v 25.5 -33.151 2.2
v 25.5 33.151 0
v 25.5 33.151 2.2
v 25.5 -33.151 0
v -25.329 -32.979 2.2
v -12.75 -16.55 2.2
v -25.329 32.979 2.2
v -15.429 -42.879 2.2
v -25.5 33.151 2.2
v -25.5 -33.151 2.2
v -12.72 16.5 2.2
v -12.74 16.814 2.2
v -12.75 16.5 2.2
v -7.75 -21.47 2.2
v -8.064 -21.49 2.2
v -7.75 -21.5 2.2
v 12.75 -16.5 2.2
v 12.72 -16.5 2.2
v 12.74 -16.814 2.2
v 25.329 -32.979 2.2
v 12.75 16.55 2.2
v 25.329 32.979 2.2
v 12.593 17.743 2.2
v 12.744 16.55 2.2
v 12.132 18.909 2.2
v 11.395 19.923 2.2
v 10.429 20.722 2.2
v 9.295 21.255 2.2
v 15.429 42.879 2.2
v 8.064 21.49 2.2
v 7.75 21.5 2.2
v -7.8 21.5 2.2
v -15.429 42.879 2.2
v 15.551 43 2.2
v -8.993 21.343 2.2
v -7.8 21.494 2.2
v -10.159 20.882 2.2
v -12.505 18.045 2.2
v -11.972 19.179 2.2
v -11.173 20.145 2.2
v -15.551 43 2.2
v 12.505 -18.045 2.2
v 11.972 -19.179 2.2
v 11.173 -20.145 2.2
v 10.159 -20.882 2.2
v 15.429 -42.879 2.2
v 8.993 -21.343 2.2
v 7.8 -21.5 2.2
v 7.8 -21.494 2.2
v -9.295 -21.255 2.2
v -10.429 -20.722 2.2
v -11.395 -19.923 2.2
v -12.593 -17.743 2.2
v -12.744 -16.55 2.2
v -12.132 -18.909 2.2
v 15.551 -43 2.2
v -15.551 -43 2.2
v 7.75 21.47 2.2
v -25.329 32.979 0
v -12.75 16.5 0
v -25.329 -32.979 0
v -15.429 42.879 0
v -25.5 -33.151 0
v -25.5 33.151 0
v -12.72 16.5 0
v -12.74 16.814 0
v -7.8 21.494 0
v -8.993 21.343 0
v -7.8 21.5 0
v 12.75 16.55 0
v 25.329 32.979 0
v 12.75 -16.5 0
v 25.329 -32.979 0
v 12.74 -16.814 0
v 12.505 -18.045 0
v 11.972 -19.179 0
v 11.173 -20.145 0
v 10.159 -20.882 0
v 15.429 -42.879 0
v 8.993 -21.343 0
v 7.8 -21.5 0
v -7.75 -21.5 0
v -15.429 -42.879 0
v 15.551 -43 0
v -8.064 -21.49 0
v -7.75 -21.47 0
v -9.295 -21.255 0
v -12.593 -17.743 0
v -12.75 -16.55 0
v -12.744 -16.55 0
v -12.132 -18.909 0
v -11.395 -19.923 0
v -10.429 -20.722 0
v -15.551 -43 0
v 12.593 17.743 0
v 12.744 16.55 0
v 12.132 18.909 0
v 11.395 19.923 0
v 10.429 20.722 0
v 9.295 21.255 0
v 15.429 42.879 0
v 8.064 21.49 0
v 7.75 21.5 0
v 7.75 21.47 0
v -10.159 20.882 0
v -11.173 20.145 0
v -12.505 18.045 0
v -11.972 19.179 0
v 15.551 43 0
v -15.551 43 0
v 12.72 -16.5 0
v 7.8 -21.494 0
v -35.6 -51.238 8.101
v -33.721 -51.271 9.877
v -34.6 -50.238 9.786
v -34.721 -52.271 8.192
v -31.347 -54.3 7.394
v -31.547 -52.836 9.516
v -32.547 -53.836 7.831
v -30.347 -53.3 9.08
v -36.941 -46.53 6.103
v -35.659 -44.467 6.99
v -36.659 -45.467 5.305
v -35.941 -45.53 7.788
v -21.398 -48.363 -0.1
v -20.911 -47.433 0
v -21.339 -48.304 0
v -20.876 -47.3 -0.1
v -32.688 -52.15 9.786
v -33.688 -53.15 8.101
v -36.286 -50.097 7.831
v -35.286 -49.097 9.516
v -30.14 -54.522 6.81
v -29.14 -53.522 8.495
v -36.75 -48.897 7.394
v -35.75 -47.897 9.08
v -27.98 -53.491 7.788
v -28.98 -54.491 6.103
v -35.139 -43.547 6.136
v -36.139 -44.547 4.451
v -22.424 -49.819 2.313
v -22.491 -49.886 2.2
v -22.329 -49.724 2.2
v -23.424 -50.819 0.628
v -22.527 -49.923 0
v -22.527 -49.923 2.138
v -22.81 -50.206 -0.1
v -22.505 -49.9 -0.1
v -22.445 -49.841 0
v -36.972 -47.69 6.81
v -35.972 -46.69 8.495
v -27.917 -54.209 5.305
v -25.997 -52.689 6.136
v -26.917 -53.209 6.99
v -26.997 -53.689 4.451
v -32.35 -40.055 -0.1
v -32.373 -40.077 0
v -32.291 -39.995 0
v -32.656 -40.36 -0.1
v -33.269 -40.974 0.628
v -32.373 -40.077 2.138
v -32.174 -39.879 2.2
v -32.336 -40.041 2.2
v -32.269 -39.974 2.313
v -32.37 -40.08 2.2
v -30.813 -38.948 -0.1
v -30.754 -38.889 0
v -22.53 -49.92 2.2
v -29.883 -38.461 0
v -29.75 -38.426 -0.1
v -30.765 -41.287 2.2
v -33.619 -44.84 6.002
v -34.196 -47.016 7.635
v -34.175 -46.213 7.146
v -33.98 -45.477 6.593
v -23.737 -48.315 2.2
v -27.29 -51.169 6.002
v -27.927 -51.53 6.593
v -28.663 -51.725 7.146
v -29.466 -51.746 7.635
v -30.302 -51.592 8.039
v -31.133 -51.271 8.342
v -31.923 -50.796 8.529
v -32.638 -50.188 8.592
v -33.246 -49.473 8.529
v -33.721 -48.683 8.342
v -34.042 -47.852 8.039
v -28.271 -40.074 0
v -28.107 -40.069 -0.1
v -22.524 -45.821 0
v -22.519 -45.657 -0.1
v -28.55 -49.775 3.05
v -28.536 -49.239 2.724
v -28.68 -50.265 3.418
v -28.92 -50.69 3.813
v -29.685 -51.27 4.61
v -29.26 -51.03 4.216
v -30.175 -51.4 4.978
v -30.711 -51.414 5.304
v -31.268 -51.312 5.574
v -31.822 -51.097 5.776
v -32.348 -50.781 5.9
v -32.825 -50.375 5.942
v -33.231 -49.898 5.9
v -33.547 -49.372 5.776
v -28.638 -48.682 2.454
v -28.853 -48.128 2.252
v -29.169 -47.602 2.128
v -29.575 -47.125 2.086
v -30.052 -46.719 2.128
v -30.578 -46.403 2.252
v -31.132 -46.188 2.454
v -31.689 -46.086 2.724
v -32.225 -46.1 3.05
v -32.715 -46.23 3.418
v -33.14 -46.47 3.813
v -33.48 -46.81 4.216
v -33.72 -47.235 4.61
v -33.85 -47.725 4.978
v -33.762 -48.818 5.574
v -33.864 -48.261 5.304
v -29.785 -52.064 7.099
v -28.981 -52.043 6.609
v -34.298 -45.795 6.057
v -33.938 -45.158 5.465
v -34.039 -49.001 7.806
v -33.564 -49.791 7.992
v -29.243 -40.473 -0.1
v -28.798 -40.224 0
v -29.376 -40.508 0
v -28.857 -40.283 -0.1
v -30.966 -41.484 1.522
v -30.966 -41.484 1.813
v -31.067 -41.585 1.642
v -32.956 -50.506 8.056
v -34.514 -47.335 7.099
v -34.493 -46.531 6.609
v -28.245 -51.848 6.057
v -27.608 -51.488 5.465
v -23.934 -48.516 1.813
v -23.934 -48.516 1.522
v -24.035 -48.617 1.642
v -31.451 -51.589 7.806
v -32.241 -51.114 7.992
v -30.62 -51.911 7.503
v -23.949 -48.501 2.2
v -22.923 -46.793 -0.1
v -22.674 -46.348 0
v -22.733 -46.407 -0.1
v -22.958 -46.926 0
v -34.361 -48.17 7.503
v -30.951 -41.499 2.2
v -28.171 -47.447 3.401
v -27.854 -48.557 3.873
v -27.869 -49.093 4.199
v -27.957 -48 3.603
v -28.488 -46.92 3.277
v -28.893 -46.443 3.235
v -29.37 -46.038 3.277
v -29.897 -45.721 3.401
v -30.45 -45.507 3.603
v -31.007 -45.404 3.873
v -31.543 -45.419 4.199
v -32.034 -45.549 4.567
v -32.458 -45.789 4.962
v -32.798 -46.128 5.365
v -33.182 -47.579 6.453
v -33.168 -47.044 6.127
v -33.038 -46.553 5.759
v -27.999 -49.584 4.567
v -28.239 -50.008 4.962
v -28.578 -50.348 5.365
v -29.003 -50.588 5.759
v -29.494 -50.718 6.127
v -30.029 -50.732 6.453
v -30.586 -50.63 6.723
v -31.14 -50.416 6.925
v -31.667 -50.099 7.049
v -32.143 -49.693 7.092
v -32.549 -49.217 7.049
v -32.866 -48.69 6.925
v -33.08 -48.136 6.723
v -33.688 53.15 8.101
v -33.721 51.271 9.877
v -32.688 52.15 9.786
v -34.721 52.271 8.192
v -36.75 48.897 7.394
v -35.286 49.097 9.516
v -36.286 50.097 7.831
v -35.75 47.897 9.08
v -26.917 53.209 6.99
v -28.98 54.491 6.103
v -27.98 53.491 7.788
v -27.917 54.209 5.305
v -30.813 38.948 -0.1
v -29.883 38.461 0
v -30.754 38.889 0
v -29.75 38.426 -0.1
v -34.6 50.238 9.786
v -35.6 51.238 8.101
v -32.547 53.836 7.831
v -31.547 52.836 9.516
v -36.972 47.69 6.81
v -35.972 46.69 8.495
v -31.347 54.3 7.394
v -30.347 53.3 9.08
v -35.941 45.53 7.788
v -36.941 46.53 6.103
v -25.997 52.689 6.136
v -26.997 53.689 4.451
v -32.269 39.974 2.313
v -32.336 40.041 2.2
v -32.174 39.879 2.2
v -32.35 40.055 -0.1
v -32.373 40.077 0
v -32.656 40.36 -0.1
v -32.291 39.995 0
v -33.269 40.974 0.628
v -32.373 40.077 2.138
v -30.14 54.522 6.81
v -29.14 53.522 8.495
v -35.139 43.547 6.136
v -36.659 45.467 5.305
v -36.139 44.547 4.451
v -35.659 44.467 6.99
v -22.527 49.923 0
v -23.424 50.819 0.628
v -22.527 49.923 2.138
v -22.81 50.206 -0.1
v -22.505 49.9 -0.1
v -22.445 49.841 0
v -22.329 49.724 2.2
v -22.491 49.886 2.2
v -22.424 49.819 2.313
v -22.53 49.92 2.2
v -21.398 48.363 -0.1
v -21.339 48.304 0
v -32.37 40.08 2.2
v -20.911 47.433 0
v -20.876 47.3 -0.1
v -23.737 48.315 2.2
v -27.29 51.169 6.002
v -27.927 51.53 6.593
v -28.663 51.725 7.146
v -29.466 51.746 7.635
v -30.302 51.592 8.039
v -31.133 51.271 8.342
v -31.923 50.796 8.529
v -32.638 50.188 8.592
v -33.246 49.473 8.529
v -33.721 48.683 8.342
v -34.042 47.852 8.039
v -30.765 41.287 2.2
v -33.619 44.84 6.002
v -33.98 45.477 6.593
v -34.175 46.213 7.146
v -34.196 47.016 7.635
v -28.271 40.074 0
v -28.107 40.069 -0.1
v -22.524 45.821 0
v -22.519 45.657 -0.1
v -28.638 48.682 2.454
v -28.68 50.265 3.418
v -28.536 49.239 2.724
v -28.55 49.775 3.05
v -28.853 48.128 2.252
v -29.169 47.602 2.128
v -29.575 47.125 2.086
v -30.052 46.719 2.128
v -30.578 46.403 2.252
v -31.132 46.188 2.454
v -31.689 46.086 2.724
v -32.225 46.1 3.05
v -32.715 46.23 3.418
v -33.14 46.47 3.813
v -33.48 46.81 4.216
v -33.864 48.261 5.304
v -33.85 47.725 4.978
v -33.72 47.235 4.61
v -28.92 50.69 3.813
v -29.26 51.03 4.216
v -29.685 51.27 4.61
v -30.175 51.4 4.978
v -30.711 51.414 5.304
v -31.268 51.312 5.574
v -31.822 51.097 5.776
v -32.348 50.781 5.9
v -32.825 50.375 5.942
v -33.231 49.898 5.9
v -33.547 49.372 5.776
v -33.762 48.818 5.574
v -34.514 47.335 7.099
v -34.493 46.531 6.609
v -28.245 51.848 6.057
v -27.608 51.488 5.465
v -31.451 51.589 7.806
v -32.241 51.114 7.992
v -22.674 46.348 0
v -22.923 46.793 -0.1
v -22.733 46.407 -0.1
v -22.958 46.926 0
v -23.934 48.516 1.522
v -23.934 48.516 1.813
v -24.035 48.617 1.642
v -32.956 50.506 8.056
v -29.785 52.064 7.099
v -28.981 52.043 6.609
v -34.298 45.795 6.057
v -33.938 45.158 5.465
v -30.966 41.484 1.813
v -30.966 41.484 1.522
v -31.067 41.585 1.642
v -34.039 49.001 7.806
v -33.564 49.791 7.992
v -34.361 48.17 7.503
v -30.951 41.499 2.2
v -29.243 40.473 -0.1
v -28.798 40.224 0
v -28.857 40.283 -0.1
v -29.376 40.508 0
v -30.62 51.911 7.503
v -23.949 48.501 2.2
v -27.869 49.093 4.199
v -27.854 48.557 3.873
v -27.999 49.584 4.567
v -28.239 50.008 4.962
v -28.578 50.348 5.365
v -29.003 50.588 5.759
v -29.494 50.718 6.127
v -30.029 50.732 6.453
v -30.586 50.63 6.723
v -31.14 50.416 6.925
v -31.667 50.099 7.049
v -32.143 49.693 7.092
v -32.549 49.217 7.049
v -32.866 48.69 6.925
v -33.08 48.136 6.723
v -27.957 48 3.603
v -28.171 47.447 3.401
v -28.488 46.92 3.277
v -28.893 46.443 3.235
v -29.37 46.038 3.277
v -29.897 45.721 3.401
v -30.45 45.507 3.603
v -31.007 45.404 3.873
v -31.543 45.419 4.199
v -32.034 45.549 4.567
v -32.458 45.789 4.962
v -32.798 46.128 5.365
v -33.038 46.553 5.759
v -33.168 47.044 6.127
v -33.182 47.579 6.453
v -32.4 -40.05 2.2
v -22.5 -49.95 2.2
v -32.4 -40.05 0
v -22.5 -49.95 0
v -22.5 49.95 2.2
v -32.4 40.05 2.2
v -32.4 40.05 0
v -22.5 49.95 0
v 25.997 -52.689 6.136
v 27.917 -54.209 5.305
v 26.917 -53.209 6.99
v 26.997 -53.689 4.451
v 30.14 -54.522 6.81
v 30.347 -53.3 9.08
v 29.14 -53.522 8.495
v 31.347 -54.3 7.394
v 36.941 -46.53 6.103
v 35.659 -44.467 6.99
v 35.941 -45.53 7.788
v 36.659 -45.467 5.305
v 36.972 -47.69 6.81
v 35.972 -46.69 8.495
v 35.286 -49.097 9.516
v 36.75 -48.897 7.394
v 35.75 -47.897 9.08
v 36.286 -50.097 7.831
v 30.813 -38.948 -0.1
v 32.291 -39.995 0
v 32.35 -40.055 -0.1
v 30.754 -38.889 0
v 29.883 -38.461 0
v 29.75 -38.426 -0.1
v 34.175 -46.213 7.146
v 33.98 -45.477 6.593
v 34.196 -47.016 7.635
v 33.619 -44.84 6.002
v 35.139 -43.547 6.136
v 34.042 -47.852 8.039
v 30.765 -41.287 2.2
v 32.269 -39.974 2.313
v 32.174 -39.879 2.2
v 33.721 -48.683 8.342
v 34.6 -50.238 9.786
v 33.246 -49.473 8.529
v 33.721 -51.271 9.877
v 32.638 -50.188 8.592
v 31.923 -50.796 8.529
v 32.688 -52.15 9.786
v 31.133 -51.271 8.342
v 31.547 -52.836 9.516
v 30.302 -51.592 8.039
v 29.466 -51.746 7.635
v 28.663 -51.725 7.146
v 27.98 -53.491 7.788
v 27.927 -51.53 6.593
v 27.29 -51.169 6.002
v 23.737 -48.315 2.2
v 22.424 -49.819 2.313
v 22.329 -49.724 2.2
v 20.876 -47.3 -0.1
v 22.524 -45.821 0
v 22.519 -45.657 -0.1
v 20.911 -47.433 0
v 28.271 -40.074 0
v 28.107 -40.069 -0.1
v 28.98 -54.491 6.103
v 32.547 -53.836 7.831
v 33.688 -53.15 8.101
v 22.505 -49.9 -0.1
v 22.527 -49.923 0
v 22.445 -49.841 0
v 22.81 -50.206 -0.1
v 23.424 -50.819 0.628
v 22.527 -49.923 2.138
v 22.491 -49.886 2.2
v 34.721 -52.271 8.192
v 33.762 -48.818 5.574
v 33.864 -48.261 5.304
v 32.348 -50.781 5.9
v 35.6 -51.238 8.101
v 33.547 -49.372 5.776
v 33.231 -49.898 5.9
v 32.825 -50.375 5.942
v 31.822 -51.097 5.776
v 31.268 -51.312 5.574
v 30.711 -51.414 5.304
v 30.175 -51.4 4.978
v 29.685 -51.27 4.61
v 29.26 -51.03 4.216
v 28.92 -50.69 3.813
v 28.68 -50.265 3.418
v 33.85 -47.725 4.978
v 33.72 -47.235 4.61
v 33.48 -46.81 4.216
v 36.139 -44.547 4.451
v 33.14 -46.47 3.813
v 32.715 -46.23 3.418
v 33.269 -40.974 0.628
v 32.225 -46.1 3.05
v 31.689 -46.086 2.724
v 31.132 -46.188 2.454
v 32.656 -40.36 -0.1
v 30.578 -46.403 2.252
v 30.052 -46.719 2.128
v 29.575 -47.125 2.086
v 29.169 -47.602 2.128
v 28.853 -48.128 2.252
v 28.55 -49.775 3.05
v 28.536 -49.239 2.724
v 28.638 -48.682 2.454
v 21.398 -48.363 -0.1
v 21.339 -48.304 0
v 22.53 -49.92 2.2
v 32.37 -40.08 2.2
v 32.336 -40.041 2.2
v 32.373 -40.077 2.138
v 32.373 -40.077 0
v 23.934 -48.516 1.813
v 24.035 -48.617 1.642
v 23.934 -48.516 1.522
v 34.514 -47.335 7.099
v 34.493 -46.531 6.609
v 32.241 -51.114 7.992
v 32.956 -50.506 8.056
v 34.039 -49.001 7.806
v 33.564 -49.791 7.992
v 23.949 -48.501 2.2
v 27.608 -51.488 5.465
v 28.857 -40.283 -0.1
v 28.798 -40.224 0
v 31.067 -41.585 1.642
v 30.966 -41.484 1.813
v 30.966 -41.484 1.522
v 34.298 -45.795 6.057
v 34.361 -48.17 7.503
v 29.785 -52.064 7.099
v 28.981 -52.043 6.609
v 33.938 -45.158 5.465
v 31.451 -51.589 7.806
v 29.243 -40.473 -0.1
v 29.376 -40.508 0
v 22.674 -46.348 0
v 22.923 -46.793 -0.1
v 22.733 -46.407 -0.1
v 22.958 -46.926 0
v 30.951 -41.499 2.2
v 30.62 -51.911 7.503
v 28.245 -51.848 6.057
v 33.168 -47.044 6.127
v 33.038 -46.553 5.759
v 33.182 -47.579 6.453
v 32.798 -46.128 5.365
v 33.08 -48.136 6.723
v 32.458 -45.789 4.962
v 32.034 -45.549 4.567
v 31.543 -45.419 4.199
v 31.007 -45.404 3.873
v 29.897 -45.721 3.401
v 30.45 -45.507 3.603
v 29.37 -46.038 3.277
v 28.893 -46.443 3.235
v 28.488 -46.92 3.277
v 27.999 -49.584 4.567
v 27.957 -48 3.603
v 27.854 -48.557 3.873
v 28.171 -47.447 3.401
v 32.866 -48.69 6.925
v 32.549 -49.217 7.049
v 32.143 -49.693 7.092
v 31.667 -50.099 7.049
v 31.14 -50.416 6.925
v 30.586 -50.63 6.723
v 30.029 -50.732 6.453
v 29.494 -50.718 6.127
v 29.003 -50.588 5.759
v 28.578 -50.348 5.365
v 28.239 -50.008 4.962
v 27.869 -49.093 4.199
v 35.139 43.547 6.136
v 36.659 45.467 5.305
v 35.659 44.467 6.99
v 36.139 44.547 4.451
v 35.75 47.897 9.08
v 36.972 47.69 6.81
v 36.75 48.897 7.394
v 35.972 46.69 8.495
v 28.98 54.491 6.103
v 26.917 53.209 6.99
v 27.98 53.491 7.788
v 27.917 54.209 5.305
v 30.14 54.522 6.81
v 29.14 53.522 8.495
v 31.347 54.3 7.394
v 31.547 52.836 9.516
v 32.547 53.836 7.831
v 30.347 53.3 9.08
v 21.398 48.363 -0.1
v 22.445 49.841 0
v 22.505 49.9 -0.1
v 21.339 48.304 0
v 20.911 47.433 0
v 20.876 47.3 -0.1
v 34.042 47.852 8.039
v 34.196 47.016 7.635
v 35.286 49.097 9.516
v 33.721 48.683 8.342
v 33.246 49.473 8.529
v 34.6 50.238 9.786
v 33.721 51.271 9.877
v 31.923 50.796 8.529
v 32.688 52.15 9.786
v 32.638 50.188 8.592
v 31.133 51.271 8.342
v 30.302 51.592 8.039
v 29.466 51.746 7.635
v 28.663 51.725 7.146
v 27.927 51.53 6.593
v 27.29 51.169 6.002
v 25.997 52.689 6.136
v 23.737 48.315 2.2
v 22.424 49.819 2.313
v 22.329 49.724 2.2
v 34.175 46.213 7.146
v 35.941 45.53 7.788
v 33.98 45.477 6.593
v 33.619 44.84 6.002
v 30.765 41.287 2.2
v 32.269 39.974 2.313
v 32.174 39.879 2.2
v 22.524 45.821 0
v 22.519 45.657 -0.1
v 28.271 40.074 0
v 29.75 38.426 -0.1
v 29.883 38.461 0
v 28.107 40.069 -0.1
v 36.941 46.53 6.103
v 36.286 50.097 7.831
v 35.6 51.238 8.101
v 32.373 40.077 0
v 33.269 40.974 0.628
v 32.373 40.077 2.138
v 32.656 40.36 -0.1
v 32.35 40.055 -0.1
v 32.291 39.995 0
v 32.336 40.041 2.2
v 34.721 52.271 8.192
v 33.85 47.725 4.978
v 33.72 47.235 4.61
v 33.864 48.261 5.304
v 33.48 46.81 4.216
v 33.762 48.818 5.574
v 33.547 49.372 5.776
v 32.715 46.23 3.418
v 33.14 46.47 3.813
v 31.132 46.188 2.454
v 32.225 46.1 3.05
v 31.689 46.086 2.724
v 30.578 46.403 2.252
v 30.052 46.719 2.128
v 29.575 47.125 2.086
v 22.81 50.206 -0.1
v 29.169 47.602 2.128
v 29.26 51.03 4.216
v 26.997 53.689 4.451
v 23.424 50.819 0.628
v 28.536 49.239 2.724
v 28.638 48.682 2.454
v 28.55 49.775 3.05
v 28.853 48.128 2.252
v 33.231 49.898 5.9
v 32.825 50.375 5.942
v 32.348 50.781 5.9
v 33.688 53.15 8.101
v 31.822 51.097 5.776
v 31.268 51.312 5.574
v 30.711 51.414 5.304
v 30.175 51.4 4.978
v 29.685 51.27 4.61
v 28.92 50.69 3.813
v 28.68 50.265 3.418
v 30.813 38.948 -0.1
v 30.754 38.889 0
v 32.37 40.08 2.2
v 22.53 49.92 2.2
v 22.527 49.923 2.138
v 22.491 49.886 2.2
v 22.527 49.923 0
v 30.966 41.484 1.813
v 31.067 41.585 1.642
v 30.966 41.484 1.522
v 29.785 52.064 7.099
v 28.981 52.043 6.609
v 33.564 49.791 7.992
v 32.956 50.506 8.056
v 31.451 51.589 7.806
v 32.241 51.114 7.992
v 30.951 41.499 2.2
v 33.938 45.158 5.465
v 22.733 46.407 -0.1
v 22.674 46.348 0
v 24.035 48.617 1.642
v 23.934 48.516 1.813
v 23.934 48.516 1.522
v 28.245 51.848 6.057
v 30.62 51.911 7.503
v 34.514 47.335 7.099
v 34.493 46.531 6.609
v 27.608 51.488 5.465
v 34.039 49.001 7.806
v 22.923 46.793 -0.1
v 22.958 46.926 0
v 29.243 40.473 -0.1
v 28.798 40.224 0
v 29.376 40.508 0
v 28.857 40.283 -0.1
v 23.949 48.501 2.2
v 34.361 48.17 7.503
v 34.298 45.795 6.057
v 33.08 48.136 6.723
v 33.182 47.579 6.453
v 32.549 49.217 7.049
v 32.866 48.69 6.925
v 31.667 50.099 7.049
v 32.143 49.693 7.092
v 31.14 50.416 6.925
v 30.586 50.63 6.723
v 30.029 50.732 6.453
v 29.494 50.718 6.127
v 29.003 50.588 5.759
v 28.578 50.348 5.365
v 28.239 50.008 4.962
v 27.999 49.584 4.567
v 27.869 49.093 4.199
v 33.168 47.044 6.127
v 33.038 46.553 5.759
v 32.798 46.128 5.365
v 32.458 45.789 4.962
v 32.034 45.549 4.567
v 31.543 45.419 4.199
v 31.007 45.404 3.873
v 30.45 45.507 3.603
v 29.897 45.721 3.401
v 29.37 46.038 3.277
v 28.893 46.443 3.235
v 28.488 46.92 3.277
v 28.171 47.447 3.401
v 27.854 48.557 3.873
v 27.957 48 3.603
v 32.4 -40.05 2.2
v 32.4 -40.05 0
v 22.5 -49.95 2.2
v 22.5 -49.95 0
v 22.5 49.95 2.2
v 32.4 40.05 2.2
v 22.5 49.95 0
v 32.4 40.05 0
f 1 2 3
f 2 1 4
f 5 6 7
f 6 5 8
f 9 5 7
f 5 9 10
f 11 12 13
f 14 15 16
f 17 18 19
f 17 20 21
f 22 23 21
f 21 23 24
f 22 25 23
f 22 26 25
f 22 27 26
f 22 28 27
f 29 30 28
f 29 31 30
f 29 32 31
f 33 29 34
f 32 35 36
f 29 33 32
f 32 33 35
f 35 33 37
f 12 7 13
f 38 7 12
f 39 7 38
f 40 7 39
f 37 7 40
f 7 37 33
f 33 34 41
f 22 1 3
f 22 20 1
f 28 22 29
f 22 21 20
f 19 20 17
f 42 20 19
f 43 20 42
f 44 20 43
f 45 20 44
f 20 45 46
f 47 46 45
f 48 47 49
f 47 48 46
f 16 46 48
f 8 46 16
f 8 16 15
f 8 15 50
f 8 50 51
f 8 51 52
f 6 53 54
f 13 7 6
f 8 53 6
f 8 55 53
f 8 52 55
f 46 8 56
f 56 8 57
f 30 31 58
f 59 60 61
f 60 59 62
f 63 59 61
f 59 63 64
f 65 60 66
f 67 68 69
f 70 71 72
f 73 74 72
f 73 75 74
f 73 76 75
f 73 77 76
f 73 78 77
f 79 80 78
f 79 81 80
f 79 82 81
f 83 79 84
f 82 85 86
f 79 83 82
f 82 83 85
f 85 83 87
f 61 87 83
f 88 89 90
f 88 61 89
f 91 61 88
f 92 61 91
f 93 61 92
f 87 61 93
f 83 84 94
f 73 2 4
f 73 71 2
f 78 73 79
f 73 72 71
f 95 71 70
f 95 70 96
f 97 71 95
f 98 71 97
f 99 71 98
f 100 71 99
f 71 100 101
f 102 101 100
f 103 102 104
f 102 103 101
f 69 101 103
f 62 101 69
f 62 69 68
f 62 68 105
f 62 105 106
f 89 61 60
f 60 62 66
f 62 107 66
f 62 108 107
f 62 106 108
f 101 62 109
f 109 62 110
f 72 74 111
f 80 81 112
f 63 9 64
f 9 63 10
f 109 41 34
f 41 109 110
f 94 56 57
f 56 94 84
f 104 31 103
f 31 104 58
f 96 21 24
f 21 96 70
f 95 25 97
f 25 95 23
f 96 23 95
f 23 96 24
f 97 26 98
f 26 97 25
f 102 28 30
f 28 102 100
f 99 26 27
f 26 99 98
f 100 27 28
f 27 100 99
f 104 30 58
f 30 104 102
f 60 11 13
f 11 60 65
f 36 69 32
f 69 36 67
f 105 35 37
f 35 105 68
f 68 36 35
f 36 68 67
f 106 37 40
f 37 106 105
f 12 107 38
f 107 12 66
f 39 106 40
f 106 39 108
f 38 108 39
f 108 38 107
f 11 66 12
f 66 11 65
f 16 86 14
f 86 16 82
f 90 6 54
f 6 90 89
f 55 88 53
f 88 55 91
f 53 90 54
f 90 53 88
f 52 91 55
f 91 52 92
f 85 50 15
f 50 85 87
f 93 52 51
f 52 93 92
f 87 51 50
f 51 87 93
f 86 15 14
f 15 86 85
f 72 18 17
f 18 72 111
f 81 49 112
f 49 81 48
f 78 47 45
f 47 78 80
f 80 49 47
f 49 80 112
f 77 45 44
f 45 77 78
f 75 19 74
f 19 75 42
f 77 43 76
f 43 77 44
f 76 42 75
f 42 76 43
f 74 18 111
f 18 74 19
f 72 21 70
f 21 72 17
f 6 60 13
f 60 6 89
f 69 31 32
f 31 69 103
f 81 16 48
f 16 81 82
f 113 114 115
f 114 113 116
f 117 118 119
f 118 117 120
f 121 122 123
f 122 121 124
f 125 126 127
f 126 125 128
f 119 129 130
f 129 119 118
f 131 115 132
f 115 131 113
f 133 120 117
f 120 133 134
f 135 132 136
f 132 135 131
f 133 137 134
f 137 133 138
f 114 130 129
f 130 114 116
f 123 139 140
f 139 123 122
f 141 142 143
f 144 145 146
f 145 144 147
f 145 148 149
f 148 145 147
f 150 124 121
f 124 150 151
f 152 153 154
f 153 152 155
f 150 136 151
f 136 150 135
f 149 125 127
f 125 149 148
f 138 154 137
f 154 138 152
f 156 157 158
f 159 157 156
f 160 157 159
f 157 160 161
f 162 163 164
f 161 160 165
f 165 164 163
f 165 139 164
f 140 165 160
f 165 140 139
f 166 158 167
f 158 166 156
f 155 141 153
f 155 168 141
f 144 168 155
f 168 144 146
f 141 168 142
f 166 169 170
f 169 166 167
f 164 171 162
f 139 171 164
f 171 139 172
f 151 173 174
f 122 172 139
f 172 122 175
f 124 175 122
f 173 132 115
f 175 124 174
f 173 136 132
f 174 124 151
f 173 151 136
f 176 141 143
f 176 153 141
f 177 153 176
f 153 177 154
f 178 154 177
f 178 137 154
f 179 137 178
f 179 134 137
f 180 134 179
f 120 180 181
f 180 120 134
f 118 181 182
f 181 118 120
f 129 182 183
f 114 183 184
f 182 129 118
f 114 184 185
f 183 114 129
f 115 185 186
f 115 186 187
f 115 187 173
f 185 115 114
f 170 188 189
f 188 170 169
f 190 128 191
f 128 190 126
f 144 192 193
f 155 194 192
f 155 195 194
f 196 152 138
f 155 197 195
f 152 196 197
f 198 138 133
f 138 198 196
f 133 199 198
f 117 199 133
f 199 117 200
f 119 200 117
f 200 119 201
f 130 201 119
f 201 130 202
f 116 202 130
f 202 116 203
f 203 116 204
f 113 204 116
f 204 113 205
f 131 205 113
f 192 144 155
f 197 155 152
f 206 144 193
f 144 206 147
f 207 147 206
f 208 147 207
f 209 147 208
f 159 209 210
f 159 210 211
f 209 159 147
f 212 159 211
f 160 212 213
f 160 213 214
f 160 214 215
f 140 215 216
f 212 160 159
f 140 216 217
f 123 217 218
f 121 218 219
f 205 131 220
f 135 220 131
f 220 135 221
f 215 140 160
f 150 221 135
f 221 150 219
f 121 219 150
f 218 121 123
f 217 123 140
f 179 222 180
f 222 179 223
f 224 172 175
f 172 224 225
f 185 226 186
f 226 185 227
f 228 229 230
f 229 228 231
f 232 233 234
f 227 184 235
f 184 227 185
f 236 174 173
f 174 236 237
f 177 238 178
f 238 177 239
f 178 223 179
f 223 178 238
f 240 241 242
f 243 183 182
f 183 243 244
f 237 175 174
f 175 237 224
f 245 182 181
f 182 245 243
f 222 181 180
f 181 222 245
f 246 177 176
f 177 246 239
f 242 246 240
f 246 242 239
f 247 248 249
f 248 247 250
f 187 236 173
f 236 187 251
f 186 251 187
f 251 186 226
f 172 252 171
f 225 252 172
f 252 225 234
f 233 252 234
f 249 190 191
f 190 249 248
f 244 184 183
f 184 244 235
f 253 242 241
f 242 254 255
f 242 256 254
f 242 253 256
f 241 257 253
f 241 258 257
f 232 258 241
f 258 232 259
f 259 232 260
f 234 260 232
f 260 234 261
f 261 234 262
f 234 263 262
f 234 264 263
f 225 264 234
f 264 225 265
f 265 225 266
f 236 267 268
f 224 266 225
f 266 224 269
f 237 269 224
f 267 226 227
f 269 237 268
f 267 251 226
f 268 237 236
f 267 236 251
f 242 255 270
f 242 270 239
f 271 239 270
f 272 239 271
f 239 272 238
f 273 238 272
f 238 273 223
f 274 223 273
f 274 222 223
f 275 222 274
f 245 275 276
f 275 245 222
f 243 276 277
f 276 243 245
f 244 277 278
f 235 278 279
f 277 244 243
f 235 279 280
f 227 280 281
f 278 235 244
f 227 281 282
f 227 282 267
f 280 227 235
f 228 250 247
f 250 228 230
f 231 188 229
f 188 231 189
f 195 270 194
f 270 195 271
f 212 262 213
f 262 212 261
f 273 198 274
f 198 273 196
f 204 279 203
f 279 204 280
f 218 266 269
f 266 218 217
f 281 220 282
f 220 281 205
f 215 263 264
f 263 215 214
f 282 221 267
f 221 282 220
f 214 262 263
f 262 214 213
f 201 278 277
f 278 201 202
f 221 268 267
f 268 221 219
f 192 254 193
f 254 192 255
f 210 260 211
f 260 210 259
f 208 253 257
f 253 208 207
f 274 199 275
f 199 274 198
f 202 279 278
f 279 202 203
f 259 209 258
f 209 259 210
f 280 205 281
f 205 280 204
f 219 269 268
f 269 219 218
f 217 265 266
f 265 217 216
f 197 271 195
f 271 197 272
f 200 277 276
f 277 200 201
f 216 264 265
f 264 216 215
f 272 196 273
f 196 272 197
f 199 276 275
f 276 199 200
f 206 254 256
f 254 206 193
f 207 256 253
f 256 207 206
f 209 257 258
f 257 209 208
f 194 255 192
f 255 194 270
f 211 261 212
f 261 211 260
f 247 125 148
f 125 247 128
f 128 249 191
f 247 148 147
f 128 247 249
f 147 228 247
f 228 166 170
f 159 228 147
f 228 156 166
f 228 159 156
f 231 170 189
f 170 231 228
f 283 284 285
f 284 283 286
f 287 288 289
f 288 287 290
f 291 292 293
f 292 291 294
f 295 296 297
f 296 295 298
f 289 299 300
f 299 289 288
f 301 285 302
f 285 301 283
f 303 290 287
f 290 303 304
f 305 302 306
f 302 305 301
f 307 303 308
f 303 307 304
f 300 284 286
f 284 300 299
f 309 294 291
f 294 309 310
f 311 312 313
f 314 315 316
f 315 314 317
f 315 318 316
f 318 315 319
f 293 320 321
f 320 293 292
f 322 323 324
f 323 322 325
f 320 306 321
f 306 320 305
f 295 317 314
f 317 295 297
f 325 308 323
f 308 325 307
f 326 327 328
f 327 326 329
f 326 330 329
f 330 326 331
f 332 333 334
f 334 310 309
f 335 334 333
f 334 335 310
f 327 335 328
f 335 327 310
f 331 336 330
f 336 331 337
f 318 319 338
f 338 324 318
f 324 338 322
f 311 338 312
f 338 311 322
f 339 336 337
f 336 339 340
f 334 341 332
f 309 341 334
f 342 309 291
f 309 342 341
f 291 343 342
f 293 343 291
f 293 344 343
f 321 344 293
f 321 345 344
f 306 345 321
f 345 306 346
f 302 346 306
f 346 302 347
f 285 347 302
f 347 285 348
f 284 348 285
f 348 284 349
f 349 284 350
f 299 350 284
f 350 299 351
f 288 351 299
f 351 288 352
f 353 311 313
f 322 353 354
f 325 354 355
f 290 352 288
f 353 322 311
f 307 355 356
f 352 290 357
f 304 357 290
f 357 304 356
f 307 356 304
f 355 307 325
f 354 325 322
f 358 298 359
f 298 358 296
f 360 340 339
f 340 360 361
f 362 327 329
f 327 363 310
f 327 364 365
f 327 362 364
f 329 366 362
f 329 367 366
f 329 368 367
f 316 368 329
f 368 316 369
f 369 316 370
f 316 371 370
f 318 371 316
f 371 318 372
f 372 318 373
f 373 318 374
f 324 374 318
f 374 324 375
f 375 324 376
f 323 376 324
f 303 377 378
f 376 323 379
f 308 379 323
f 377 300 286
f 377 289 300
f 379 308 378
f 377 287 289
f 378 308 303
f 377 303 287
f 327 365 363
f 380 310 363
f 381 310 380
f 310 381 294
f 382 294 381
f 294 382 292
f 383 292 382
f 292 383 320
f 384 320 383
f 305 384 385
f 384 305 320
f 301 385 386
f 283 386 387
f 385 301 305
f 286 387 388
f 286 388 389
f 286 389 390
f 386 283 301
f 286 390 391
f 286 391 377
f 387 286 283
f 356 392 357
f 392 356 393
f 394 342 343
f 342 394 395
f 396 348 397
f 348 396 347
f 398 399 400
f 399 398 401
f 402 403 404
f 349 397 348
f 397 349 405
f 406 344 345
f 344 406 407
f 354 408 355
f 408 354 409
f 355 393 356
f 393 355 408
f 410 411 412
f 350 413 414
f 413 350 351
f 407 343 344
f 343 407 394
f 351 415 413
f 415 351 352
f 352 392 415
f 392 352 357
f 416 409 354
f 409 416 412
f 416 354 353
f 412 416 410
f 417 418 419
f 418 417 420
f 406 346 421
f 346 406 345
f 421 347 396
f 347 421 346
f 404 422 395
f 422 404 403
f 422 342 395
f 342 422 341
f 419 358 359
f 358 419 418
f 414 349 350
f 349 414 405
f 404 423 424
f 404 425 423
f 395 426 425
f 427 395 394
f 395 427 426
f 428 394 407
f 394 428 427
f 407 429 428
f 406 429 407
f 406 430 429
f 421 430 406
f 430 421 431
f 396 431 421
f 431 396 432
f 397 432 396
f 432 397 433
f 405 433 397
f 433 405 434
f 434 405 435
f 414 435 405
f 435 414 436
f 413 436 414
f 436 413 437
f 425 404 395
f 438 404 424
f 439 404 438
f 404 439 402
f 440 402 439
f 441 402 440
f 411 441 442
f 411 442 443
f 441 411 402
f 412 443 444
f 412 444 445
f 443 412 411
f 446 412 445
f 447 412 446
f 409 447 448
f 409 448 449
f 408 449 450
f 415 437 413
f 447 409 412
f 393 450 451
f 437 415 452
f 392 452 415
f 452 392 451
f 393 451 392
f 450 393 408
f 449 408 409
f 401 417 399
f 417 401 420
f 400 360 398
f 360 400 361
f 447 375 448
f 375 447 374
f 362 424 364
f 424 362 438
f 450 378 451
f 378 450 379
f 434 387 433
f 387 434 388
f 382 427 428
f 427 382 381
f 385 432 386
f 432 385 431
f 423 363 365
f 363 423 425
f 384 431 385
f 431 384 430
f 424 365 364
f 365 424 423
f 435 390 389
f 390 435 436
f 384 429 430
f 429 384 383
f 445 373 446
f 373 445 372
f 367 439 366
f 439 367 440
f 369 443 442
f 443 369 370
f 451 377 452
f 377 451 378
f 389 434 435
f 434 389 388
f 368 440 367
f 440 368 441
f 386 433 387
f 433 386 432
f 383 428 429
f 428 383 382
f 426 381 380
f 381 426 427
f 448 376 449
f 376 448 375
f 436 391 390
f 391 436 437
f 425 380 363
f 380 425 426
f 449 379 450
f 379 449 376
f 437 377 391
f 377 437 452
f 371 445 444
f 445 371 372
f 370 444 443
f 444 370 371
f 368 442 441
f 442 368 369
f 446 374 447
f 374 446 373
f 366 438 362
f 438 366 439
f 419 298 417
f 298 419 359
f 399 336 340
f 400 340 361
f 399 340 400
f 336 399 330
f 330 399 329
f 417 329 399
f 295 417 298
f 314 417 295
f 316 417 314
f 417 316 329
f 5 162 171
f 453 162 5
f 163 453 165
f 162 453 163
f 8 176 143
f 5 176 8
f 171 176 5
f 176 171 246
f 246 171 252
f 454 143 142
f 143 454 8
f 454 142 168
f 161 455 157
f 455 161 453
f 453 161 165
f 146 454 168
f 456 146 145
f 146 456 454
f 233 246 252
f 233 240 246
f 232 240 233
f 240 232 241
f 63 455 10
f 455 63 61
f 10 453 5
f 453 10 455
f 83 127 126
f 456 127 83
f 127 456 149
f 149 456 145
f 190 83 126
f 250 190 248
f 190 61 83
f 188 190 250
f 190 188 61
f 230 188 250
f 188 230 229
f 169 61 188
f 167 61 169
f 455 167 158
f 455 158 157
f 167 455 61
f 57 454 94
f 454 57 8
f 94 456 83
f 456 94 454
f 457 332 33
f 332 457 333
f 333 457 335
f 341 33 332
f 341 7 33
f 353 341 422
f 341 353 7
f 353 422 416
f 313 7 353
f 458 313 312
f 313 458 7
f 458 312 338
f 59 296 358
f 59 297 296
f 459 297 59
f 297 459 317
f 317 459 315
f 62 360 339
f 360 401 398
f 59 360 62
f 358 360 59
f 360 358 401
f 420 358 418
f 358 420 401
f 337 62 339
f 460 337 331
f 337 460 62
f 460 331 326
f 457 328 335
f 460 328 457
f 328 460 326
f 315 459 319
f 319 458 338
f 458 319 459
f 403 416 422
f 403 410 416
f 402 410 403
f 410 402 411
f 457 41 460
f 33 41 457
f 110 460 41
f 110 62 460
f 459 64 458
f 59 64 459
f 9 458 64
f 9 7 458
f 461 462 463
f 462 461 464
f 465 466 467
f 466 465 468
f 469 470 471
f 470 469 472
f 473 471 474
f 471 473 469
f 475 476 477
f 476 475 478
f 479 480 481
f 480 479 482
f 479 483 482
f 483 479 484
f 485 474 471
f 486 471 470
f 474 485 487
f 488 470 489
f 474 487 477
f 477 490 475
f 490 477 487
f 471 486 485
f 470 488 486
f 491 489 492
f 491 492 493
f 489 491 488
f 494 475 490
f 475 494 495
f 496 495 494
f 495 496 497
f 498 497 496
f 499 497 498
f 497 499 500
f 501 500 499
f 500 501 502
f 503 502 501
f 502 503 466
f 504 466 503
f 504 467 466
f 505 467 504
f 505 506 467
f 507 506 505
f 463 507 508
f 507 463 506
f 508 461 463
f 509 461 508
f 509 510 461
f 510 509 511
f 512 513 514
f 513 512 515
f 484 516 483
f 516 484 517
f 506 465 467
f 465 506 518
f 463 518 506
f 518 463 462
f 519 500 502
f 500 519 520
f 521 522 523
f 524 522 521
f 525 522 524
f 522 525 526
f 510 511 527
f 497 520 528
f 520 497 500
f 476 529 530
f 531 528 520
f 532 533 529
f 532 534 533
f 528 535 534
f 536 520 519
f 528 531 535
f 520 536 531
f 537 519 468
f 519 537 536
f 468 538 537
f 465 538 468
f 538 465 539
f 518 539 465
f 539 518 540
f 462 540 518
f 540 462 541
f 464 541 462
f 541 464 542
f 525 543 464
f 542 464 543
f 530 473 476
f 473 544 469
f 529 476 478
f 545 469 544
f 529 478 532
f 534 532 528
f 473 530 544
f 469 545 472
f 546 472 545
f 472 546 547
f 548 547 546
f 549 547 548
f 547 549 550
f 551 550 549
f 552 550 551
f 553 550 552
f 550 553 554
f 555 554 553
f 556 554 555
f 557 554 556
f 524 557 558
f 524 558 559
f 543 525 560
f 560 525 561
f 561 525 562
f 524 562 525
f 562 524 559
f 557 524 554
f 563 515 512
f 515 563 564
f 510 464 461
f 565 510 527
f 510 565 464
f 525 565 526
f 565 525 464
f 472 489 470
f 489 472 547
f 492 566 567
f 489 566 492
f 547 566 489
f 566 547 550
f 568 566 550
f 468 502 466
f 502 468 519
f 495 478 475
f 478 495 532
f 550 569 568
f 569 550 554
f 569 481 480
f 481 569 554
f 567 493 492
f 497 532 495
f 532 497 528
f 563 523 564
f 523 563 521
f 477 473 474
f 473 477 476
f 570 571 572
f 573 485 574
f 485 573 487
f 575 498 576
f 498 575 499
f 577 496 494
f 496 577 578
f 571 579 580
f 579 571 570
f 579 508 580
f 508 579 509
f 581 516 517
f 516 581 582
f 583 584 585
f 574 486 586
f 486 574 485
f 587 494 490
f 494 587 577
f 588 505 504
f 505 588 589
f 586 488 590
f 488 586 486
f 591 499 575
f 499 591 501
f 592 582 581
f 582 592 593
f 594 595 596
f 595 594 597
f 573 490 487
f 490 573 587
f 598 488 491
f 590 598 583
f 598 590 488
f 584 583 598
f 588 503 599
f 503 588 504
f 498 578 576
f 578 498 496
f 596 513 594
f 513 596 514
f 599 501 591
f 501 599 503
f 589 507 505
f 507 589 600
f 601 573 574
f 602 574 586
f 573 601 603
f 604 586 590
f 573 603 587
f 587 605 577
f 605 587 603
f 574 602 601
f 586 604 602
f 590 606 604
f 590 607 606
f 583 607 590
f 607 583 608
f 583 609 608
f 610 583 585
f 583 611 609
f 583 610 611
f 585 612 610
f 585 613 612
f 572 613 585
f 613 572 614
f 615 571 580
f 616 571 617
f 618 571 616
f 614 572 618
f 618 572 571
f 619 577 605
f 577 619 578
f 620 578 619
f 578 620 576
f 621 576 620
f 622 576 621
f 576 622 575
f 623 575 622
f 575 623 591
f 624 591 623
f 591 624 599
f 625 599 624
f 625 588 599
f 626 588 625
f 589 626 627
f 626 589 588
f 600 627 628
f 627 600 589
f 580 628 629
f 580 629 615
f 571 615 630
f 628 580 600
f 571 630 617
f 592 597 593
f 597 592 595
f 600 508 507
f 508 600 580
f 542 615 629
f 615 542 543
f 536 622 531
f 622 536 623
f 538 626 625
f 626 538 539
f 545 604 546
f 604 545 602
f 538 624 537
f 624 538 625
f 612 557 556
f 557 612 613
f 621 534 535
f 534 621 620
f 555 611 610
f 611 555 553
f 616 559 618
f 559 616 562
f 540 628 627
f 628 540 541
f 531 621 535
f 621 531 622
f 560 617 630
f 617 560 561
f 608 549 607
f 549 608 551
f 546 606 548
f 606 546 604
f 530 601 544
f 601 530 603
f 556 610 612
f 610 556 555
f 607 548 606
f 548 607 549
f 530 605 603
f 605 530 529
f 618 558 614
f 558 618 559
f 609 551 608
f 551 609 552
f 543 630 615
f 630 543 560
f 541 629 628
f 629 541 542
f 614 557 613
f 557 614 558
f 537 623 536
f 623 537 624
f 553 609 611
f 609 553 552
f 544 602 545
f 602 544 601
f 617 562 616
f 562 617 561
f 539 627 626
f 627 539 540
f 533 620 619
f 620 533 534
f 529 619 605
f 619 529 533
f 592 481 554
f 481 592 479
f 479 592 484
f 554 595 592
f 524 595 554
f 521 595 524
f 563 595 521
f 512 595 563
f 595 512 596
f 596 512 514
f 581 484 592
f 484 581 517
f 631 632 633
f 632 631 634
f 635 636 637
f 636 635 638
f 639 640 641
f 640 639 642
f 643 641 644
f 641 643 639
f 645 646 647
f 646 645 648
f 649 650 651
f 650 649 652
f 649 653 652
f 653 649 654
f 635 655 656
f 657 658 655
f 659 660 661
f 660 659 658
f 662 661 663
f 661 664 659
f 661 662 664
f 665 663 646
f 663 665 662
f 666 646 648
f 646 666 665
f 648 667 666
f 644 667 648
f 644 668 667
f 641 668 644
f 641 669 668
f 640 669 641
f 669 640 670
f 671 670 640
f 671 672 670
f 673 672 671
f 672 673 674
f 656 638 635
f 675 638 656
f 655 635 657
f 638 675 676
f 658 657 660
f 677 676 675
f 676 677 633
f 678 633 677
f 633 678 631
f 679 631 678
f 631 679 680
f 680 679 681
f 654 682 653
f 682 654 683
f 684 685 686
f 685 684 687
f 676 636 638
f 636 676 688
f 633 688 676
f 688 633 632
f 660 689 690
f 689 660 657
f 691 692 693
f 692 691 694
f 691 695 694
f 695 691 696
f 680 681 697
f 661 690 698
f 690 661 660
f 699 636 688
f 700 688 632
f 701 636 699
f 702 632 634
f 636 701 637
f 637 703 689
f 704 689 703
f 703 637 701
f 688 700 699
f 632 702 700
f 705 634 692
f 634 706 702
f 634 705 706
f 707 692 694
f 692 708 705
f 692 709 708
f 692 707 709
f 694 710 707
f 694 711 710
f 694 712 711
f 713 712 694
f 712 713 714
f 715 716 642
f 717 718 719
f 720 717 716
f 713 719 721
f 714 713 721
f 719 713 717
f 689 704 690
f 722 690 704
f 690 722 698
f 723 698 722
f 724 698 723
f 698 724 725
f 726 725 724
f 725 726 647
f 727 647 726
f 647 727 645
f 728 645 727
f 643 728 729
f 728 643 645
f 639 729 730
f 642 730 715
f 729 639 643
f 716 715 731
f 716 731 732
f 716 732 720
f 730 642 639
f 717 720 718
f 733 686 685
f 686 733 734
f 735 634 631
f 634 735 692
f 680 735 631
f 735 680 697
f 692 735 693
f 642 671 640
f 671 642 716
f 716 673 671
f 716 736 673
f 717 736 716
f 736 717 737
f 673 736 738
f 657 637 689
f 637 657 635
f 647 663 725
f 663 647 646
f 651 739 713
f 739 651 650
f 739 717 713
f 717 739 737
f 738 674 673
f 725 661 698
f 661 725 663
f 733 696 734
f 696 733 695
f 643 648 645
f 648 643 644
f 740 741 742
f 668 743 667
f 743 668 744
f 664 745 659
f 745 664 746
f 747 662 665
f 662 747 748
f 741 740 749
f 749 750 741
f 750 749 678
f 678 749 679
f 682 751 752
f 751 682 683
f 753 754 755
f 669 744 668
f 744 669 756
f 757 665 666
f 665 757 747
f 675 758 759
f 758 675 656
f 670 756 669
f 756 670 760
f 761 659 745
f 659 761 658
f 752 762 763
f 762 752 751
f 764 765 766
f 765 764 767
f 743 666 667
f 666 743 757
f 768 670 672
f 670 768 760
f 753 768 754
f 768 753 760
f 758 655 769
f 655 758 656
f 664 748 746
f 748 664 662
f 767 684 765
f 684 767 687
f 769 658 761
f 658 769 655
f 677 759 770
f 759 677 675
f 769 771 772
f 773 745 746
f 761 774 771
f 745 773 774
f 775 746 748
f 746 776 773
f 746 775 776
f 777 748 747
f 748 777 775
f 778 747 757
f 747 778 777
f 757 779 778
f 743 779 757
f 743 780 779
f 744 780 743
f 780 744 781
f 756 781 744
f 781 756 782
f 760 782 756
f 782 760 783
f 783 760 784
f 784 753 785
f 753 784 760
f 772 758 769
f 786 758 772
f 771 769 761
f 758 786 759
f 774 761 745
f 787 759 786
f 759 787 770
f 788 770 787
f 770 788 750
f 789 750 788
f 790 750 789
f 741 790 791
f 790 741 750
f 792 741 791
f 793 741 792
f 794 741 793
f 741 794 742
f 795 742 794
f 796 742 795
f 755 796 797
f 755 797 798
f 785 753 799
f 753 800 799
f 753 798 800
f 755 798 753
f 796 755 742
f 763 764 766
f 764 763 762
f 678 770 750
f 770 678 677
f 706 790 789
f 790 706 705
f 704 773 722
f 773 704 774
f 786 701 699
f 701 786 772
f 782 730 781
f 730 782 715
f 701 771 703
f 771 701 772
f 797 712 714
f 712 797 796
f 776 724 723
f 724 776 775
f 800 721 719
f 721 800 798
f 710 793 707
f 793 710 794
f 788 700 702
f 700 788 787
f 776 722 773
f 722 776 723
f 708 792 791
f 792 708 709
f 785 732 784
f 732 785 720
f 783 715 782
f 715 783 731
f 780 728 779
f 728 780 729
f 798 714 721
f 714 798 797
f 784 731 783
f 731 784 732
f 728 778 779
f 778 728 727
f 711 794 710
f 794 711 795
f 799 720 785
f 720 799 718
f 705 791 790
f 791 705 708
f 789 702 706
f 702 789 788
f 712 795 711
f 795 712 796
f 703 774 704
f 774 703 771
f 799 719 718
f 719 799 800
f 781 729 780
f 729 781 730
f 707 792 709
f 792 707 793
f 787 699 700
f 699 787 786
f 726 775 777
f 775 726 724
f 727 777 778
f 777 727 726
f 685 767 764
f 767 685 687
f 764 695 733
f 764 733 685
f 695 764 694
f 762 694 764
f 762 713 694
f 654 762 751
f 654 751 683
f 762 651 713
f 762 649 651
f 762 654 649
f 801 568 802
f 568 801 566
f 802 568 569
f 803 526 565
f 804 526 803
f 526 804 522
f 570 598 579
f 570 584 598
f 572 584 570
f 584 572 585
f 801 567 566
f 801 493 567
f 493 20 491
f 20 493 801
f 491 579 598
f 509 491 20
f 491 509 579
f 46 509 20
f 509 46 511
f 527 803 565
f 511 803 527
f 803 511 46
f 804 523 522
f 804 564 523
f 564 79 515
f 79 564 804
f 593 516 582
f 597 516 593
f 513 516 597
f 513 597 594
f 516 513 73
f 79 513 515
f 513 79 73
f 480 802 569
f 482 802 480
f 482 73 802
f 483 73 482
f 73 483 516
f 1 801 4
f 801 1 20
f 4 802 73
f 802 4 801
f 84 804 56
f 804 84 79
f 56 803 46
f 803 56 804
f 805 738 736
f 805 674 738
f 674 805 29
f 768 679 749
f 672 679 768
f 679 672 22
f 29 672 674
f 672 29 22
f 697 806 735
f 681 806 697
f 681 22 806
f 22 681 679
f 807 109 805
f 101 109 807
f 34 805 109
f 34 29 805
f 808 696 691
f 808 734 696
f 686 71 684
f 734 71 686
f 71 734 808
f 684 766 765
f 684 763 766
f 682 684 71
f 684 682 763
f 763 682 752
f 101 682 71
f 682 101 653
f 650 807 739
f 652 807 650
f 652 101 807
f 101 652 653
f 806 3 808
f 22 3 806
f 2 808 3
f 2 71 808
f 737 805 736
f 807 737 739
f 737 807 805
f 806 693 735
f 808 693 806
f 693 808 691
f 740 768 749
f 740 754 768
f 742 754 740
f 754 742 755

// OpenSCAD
// file: library/nutsnbolts/data-access.scad
// Norm Nuts and Bolts - a OpenSCAD library
// Copyright (C) 2012  Johannes Kneer

// This program is free software: you can redistribute it and/or modify
// it under the terms of the GNU General Public License as published by
// the Free Software Foundation, either version 3 of the License, or
// (at your option) any later version.

// This program is distributed in the hope that it will be useful,
// but WITHOUT ANY WARRANTY; without even the implied warranty of
// MERCHANTABILITY or FITNESS FOR A PARTICULAR PURPOSE.  See the
// GNU General Public License for more details.

// You should have received a copy of the GNU General Public License
// along with this program.  If not, see <http://www.gnu.org/licenses/>.


// DATABASE ACCESS FUNCTIONS AND CONSTANTS



// == CONSTANTS == 

// screw table access keys
_NB_S_DESC            = 0;
_NB_S_FAMKEY			 = 1;
_NB_S_LENGTH          = 2;
_NB_S_NOTHREAD_LENGTH = 3;

_NB_F_DESC			 = 0;
_NB_F_OUTER_DIA       = 1;
_NB_F_INNER_DIA       = 2;
_NB_F_LEAD            = 3; 
_NB_F_KEY             = 4;
_NB_F_KEY_DEPTH       = 5;
_NB_F_HEAD_HEIGHT     = 6;
_NB_F_HEAD_DIA        = 7;
_NB_F_NUT_KEY         = 8;
_NB_F_NUT_HEIGHT      = 9;


// == FUNCTIONS ==

// _get_screw("descriptor")   with descriptor = M8x25
//   find the line for a general object in the data matrix

function _get_screw(n) = data_screw[search([n], data_screw)[0]];
function _get_screw_fam(n) = data_screw_fam[search([_get_screw(n)[_NB_S_FAMKEY]], data_screw_fam)[0]];

function _get_fam(n) = data_screw_fam[search([n], data_screw_fam)[0]];


// _get_XXXXX("descriptor") functions
// find a single property in the database

function _get_desc(n)        = _get_screw(n)[_NB_S_DESC];
function _get_famkey(n)         = _get_screw(n)[_NB_S_FAMKEY];
function _get_length(n)      = _get_screw(n)[_NB_S_LENGTH];
function _get_nt_length(n)   = _get_screw(n)[_NB_S_NOTHREAD_LENGTH];

function _get_outer_dia(n)   = _get_screw_fam(n)[_NB_F_OUTER_DIA];
function _get_inner_dia(n)   = _get_screw_fam(n)[_NB_F_INNER_DIA];
function _get_lead(n)        = _get_screw_fam(n)[_NB_F_LEAD];
function _get_head_height(n) = _get_screw_fam(n)[_NB_F_HEAD_HEIGHT];
function _get_head_dia(n)    = _get_screw_fam(n)[_NB_F_HEAD_DIA];
function _get_nut_key(n)     = _get_screw_fam(n)[_NB_F_NUT_KEY];
function _get_nut_height(n)  = _get_screw_fam(n)[_NB_F_NUT_HEIGHT];
// file: library/modules-utils.scad
// tarot 680 pro  - a OpenSCAD 
// Copyright (C) 2015  Gerard Valade

// This program is free software: you can redistribute it and/or modify
// it under the terms of the GNU General Public License as published by
// the Free Software Foundation, either version 3 of the License, or
// (at your option) any later version.

// This program is distributed in the hope that it will be useful,
// but WITHOUT ANY WARRANTY; without even the implied warranty of
// MERCHANTABILITY or FITNESS FOR A PARTICULAR PURPOSE.  See the
// GNU General Public License for more details.

// You should have received a copy of the GNU General Public License
// along with this program.  If not, see <http://www.gnu.org/licenses/>.


include <params.scad>
use <nutsnbolts/cyl_head_bolt.scad>
use <round-corners-cube.scad>

module bom(code, desc, category) {
	echo(str("BOM: ",code," - ", desc, "; ", category));
}

module hexaprismx(
	ri =  1.0,  // radius of inscribed circle
	h  =  1.0)  // height of hexaprism
{ // -----------------------------------------------

	ra = ri*2/sqrt(3);
	cylinder(r = ra, h=h, $fn=6, center=true);
}

module arc( height, depth, radius, degrees ) {
    // This dies a horible death if it's not rendered here 
    // -- sucks up all memory and spins out of control 
    render() {
        difference() {
            // Outer ring
            rotate_extrude($fn = 100)
                translate([radius - height, 0, 0])
                    square([height,depth]);
         
            // Cut half off
            translate([0,-(radius+1),-.5]) 
                cube ([radius+1,(radius+1)*2,depth+1]);
         
            // Cover the other half as necessary
            rotate([0,0,180-degrees])
            translate([0,-(radius+1),-.5]) 
                cube ([radius+1,(radius+1)*2,depth+1]);
         
        }
    }
}
module fillet(r, h) {
    translate([r / 2, r / 2, 0])

        difference() {
            cube([r + 0.01, r + 0.01, h], center = true);

            translate([r/2, r/2, 0])
                cylinder(r = r, h = h + 1, center = true);

        }
}

module pillar(l=pillar_heigth, $fn=30)
{
	color(pillar_color) difference() {
		translate([0, 0, l/2])  hexaprismx(ri=6/2, h=l);
		translate([0, 0, -1])  cylinder(d=M25_inner_dia, h=l+2);
	}
}

module T680Pro_holes(type=0, d=M25_outer_dia, $fn=30)
{
	module holeScrew(d)
	{
		if (type==0) cylinder(d=d, h=10, center=true);
		if (type==1) translate([0, 0, 1]) screw("M2.5x25");
	}
	for (r=[0, 180]) {
		// inner, middle, external holes
		for (x = [71.5, 148]) { 
			for (y = [-1,1]) { 
				rotate([0,0,r]) translate([(x/2), y*(22/2), 0]) holeScrew(d=d);
			}
		}
	}
	if (type==0)
	for (r=[90, -90]) {
		for (x = [73.5, 145]) { 
			for (y = [-1,1]) { 
				rotate([0,0,r]) translate([(x/2), y*(42.5/2), 0]) holeScrew(d=M25_head_dia);
			}
		}
	}
	
}

module draw_option_spacer(draw_type=0, xaxis=[0,1], hole_dia=M25_inner_dia, heigth=10, center=true, $fn=30)
{
	hole_dia = draw_type == 0 ? hole_dia : 6;
	heigth = draw_type == 0 ? 10 : 8;
	zaxis = draw_type == 0 ? -1 : 0;
	for (x = xaxis) { 
		for (y = [-1,1]) {
			xpos = (center) ? (x*2-1) * option_hole_length/2 :  x * option_hole_length;
			ypos = y * option_hole_width/2;
			translate([xpos, ypos, zaxis])  rotate([0, 0, 0])  {
				if (draw_type == 0) cylinder(d=hole_dia, h=heigth+2, center=false);
				if (draw_type == 1) cylinder(d=hole_dia, h=heigth, center=false);
				if (draw_type == 2) translate([0, 0, 0]) rotate([0, 0, 0]) screw("M2.5x10");
				if (debug) #cylinder(d=0.2, h=heigth+20, center=false);
			}
		}
	}
}

module controller_board($fn=30)
{
	difference() {
		translate([0, 0, 1.24/2]) {
			color([0.9, 0.5, 0]) round_corners_cube(36.2, 36.2, 1.24, 3);
		}
		for (x = [-1, 1]) { 
			for (y = [-1, 1]) {
				translate([x*(cc3d_hole_width/2), y*(cc3d_hole_width/2), -4]) cylinder(d=3, h=10, center=false, $fn=20);
			} 
		}
	}
	for (x = [-1, 1]) { 
		for (y = [-1, 1]) {
			translate([x*(cc3d_hole_width/2), y*(cc3d_hole_width/2), 1]) screw("M3x5");
		} 
	}
}


module powerBoard($fn=30)
{
	controller_board();
	translate([0, 0, (1.24+4)/2]) round_corners_cube(21.45, 24.33, 4, 3);
}




module damperEars(type, ear_lengthx=4, damper_dia=10.5, damper_angle=40, plate_color, cur_view=0, $fn=30)
{

	function is_damper_draw(n) = n[0]==0; 
	function is_damper_show(n) = n[0]==1;
	function is_damper_cut(n) = n[0]==2; 
	function is_damper_top(n) = n[1]==1; 
	function is_damper_bottom(n) = n[1]==0; 

	cte=0.45;
	damper_length= is_damper_bottom(type) ? 107 : 95+5;
	damper_width= is_damper_bottom(type) ? 67 : 56+5;
	damper_heigth= is_damper_bottom(type) ? 4.5 : 0;
	ear_length = is_damper_bottom(type) ? 7.9 : 6;
	
	module ear(x, tz=0, cte=0, ear_length, tin=plate_tin)
	{
		 hull() {
			translate([x*ear_length, 0, tz]) cylinder(d=13-cte, h=tin, center=true);
			translate([0, 0, tz]) cylinder(d=14-cte, h=tin, center=true);
		}
	}
	
	module drawEars() {
		//drawEars2();
		translate([0, 0, damper_heigth])
		for (x = [-1,1]) { 
			for (y = [-1,1]) {
				translate([(x*damper_width*cte), (y*damper_length*cte), 0]) rotate([0, 0, x*y*45]) { 
					if (is_damper_top(type)) translate([-x*5, 0, plate_tin/2]) cube([10, 14, plate_tin], center=true);
					if (is_damper_bottom(type)) translate([-x*5, 0, -(damper_heigth+plate_tin)/2]) cube([10, 13, plate_tin], center=true);
					if (is_damper_bottom(type)) translate([-x*1.3, 0, -damper_heigth/2]) cube([plate_tin*1.6, 13, damper_heigth], center=true);
				}
				translate([0,0,1]) difference() 
				{
					translate([(x*damper_width*cte), (y*damper_length*cte), 0]) rotate([0, 0, x*y*45]) rotate([0,-x*damper_angle, 0]) {  
						difference() 
						{
							union() {
								color(plate_color) ear(x, ear_length=ear_length);
							}
							ear(x, 1.5, 4, ear_length=ear_length);
							translate([x*ear_length, 0, 5])  rotate([0, 180, 0])  cylinder(d=6, h=40, center=false);
							if (cur_view && x==1)
							{
								translate([x*ear_length, -10, -5]) color(cut_color) cube([10, 20, 20]);
							}
						} 
					}
			
					// vertical truncate
					translate([(x*damper_width*cte), (y*damper_length*cte), -(3/2*plate_tin)])  cube([20, 20, plate_tin*2], center=true);
				}
			}
		}
	}
	
	module showDamper()
	{
		module damper(heigth=13)
		{
			difference() {	
				union() {
					cylinder(d=6, h=heigth, center =true);
					cylinder(d=8.5, h=6.5, center =true);
					translate([0,0,(heigth-1.5)/2]) cylinder(d=8.5, h=1.5, center =true);
					translate([0,0,-(heigth-1.5)/2]) cylinder(d=8.5, h=1.5, center =true);
				}
				cylinder(d=4, h=heigth+0.1, center =true);
			}
		}

		for (x = [-1,1]) { 
			for (y = [-1,1]) {
				translate([(x*damper_width*cte), (y*damper_length*cte), damper_heigth]) rotate([0, 0, x*y*45]) rotate([0,-x*damper_angle, 0]) {  
							
					difference() 
					{
						translate([x*ear_length, 0, -4.5]) color(damper_color) damper();
						if (cur_view && x==1)
						{
							translate([x*ear_length, -10, -15]) color(cut_color)  cube([10, 20, 25]);
						}
					}
				}
			}
		}
	}
	module cutDamper()
	{
		for (x = [-1,1]) { 
			for (y = [-1,1]) {
				translate([(x*damper_width*cte), (y*damper_length*cte), damper_heigth]) rotate([0, 0, x*y*45]) {// rotate([0,-x*damper_angle, 0]) {  
					if (is_damper_bottom(type)) translate([x*1.96, 0, -(damper_heigth+plate_tin+0.1)/2]) cube([3, 13, damper_heigth], center=true);
					if (is_damper_top(type)) 
					{
						rotate([0, -x*damper_angle, 0]) { 
							translate([x*2, 0, -plate_tin*3/2+0.2]) cube([5, 13, 4], center=true);
						}
					}
				}
			}
		}
	}
	if (is_damper_draw(type)) drawEars();
	//if (is_damper_show(type) && viewModule) showDamper();
	if (is_damper_show(type)) showDamper();
	if (is_damper_cut(type)) cutDamper();
}
// file: library/round-corners-cube.scad
/*
http://codeviewer.org/view/code:1b36 
Copyright (C) 2011 Sergio Vilches
This program is free software: you can redistribute it and/or modify it under the terms of the GNU General Public License as published by the Free Software Foundation, either version 3 of the License, or (at your option) any later version.
This program is distributed in the hope that it will be useful, but WITHOUT ANY WARRANTY; without even the implied warranty of MERCHANTABILITY or FITNESS FOR A PARTICULAR PURPOSE. See the GNU General Public License for more details. You should have received a copy of the GNU General Public License along with this program. If not, see <http://www.gnu.org/licenses/>.
Contact: s.vilches.e@gmail.com


    ----------------------------------------------------------- 
                 Round Corners Cube (Extruded)                
      round_corners_cube(x,y,z,r) Where:                        
         - x = Xdir width                                     
         - y = Ydir width                                     
         - z = Height of the cube                             
         - r = Rounding radious                               
                                                              
      Example: roundCornerCube(10,10,2,1);                    
     *Some times it's needed to use F6 to see good results!   
 	 ----------------------------------------------------------- 
*/
// Test it!
// round_corners_cube(10,5,2,1);


module createMeniscus(h,radius) // This module creates the shape that needs to be substracted from a cube to make its corners rounded.
difference(){        //This shape is basicly the difference between a quarter of cylinder and a cube
   translate([radius/2+0.1,radius/2+0.1,0]){
      cube([radius+0.2,radius+0.1,h+0.2],center=true);         // All that 0.x numbers are to avoid "ghost boundaries" when substracting
   }

   cylinder(h=h+0.2,r=radius,$fn = 25,center=true);
}


module round_corners_cube(x,y,z,r)  // Now we just substract the shape we have created in the four corners
difference(){
   cube([x,y,z], center=true);

translate([x/2-r,y/2-r]){  // We move to the first corner (x,y)
      rotate(0){  
         createMeniscus(z,r); // And substract the meniscus
      }
   }
   translate([-x/2+r,y/2-r]){ // To the second corner (-x,y)
      rotate(90){
         createMeniscus(z,r); // But this time we have to rotate the meniscus 90 deg
      }
   }
      translate([-x/2+r,-y/2+r]){ // ... 
      rotate(180){
         createMeniscus(z,r);
      }
   }
      translate([x/2-r,-y/2+r]){
      rotate(270){
         createMeniscus(z,r);
      }
   }
}
// file: library/params.scad
//function isfull_view(n) = n==full_view;

bottom_plate_color = [0.3, 0.7, 0.7];
top_plate_color = [0.8, 0.8, 0.3];
damper_color = [0.8, 0.2, 0.3];
gps_bracket_color = [0.3, 0.8, 0.3, 1];
option_bracket_color = [0.8, 0.8, 0.3];
pillar_color = [0.8, 0.5, 0.3];
cut_color = [0.9, 0, 0];

cc3d_hole_width = 30.5;
cut_view=false;
debug=true;
//viewModule = isfull_view(viewType);
cut_view_debug=0;

M25_outer_dia=2.8; 
M25_inner_dia=2.05; 
M25_head_dia=5;
M3_outer_dia=3.5; 
M3_inner_dia=2.8;
M3_head_dia=5.4+0.5;
// SMA Thread
M6_outer_dia=6.8;



plate_tin = 2.2;

pillar_heigth = 27;

pillar_hole_width = 64;
pillar_hole_length = 64;

option_hole_length = cc3d_hole_width;
option_hole_width = cc3d_hole_width;



DAMPER_EARS_DRAW_TOP=[0,1];
DAMPER_EARS_DRAW_BOTTOM=[0,0];
DAMPER_EARS_SHOW_DAMPER=[1,1];
DAMPER_EARS_CUT_BOTTOM=[2,0];
DAMPER_EARS_CUT_TOP=[2,1];
// main file
// tarot 680 pro - a OpenSCAD 
// Copyright (C) 2015  Gerard Valade

// This program is free software: you can redistribute it and/or modify
// it under the terms of the GNU General Public License as published by
// the Free Software Foundation, either version 3 of the License, or
// (at your option) any later version.

// This program is distributed in the hope that it will be useful,
// but WITHOUT ANY WARRANTY; without even the implied warranty of
// MERCHANTABILITY or FITNESS FOR A PARTICULAR PURPOSE.  See the
// GNU General Public License for more details.

// You should have received a copy of the GNU General Public License
// along with this program.  If not, see <http://www.gnu.org/licenses/>.


include <library/params.scad>
use <library/round-corners-cube.scad>
use <library/modules-utils.scad>

module PX4_case()
{
	color([0.4, 0.3, 0.8]) {
		translate([0, 0, 17/2]) {
			round_corners_cube(50, 80, 17, 1);
		}
	}
}


module controllerPlate(full_view=0, cut_view=0)
{
	controller_length = 82;
	controller_width = 50;
	plate_length = controller_length+4;
	plate_width = controller_width+1;
	damper_length = controller_length+5;
	damper_width = controller_width+5;
	
	module plates()
	{
		translate([0, 0, plate_tin/2]) {
			difference() {
				union() {
					round_corners_cube(plate_width, plate_length, plate_tin, 3);
					
				}
				round_corners_cube(plate_width/2, plate_length/2, plate_tin+5, 5);
			}
		}
	}
	
	difference() 
	{
		color(top_plate_color)
		union()
		{
			plates();
			translate([0, 0, 0]) damperEars(DAMPER_EARS_DRAW_TOP, plate_color=top_plate_color);
			
		}
		
		if (cut_view) {
			translate([-20, -20, 0]) cube([15,15,10], center=true);
		}

		translate([0, 0, 0]) damperEars(DAMPER_EARS_CUT_TOP, plate_color=top_plate_color);
		
	}
	if (full_view) {
		translate([0, 0, plate_tin/2]) damperEars(DAMPER_EARS_SHOW_DAMPER, plate_color=top_plate_color, viewModule=viewModule);
		translate([0, 0, plate_tin]) PX4_case();
		//else translate([0, 0, plate_tin+1.8]) controller_board();			
	}
	
}

controllerPlate();
